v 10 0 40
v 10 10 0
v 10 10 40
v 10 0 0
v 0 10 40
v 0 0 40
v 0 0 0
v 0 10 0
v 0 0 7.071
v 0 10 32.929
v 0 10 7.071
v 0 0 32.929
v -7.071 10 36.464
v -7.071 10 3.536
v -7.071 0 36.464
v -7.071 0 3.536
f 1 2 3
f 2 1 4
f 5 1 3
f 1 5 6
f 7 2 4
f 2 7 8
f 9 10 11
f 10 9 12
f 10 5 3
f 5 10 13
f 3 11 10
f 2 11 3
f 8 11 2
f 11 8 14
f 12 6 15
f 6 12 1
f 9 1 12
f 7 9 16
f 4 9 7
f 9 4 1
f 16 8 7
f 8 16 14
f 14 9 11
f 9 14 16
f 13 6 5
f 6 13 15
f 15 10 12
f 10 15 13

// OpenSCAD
cube([10,10,40]);
scale([1,1,0.5])
	rotate([0,-45,0])
		cube([10,10,10]);
translate([0,0,40 - sqrt(2) * 5])
	scale([1,1,0.5])
		rotate([0,-45,0])
			cube([10,10,10]);
